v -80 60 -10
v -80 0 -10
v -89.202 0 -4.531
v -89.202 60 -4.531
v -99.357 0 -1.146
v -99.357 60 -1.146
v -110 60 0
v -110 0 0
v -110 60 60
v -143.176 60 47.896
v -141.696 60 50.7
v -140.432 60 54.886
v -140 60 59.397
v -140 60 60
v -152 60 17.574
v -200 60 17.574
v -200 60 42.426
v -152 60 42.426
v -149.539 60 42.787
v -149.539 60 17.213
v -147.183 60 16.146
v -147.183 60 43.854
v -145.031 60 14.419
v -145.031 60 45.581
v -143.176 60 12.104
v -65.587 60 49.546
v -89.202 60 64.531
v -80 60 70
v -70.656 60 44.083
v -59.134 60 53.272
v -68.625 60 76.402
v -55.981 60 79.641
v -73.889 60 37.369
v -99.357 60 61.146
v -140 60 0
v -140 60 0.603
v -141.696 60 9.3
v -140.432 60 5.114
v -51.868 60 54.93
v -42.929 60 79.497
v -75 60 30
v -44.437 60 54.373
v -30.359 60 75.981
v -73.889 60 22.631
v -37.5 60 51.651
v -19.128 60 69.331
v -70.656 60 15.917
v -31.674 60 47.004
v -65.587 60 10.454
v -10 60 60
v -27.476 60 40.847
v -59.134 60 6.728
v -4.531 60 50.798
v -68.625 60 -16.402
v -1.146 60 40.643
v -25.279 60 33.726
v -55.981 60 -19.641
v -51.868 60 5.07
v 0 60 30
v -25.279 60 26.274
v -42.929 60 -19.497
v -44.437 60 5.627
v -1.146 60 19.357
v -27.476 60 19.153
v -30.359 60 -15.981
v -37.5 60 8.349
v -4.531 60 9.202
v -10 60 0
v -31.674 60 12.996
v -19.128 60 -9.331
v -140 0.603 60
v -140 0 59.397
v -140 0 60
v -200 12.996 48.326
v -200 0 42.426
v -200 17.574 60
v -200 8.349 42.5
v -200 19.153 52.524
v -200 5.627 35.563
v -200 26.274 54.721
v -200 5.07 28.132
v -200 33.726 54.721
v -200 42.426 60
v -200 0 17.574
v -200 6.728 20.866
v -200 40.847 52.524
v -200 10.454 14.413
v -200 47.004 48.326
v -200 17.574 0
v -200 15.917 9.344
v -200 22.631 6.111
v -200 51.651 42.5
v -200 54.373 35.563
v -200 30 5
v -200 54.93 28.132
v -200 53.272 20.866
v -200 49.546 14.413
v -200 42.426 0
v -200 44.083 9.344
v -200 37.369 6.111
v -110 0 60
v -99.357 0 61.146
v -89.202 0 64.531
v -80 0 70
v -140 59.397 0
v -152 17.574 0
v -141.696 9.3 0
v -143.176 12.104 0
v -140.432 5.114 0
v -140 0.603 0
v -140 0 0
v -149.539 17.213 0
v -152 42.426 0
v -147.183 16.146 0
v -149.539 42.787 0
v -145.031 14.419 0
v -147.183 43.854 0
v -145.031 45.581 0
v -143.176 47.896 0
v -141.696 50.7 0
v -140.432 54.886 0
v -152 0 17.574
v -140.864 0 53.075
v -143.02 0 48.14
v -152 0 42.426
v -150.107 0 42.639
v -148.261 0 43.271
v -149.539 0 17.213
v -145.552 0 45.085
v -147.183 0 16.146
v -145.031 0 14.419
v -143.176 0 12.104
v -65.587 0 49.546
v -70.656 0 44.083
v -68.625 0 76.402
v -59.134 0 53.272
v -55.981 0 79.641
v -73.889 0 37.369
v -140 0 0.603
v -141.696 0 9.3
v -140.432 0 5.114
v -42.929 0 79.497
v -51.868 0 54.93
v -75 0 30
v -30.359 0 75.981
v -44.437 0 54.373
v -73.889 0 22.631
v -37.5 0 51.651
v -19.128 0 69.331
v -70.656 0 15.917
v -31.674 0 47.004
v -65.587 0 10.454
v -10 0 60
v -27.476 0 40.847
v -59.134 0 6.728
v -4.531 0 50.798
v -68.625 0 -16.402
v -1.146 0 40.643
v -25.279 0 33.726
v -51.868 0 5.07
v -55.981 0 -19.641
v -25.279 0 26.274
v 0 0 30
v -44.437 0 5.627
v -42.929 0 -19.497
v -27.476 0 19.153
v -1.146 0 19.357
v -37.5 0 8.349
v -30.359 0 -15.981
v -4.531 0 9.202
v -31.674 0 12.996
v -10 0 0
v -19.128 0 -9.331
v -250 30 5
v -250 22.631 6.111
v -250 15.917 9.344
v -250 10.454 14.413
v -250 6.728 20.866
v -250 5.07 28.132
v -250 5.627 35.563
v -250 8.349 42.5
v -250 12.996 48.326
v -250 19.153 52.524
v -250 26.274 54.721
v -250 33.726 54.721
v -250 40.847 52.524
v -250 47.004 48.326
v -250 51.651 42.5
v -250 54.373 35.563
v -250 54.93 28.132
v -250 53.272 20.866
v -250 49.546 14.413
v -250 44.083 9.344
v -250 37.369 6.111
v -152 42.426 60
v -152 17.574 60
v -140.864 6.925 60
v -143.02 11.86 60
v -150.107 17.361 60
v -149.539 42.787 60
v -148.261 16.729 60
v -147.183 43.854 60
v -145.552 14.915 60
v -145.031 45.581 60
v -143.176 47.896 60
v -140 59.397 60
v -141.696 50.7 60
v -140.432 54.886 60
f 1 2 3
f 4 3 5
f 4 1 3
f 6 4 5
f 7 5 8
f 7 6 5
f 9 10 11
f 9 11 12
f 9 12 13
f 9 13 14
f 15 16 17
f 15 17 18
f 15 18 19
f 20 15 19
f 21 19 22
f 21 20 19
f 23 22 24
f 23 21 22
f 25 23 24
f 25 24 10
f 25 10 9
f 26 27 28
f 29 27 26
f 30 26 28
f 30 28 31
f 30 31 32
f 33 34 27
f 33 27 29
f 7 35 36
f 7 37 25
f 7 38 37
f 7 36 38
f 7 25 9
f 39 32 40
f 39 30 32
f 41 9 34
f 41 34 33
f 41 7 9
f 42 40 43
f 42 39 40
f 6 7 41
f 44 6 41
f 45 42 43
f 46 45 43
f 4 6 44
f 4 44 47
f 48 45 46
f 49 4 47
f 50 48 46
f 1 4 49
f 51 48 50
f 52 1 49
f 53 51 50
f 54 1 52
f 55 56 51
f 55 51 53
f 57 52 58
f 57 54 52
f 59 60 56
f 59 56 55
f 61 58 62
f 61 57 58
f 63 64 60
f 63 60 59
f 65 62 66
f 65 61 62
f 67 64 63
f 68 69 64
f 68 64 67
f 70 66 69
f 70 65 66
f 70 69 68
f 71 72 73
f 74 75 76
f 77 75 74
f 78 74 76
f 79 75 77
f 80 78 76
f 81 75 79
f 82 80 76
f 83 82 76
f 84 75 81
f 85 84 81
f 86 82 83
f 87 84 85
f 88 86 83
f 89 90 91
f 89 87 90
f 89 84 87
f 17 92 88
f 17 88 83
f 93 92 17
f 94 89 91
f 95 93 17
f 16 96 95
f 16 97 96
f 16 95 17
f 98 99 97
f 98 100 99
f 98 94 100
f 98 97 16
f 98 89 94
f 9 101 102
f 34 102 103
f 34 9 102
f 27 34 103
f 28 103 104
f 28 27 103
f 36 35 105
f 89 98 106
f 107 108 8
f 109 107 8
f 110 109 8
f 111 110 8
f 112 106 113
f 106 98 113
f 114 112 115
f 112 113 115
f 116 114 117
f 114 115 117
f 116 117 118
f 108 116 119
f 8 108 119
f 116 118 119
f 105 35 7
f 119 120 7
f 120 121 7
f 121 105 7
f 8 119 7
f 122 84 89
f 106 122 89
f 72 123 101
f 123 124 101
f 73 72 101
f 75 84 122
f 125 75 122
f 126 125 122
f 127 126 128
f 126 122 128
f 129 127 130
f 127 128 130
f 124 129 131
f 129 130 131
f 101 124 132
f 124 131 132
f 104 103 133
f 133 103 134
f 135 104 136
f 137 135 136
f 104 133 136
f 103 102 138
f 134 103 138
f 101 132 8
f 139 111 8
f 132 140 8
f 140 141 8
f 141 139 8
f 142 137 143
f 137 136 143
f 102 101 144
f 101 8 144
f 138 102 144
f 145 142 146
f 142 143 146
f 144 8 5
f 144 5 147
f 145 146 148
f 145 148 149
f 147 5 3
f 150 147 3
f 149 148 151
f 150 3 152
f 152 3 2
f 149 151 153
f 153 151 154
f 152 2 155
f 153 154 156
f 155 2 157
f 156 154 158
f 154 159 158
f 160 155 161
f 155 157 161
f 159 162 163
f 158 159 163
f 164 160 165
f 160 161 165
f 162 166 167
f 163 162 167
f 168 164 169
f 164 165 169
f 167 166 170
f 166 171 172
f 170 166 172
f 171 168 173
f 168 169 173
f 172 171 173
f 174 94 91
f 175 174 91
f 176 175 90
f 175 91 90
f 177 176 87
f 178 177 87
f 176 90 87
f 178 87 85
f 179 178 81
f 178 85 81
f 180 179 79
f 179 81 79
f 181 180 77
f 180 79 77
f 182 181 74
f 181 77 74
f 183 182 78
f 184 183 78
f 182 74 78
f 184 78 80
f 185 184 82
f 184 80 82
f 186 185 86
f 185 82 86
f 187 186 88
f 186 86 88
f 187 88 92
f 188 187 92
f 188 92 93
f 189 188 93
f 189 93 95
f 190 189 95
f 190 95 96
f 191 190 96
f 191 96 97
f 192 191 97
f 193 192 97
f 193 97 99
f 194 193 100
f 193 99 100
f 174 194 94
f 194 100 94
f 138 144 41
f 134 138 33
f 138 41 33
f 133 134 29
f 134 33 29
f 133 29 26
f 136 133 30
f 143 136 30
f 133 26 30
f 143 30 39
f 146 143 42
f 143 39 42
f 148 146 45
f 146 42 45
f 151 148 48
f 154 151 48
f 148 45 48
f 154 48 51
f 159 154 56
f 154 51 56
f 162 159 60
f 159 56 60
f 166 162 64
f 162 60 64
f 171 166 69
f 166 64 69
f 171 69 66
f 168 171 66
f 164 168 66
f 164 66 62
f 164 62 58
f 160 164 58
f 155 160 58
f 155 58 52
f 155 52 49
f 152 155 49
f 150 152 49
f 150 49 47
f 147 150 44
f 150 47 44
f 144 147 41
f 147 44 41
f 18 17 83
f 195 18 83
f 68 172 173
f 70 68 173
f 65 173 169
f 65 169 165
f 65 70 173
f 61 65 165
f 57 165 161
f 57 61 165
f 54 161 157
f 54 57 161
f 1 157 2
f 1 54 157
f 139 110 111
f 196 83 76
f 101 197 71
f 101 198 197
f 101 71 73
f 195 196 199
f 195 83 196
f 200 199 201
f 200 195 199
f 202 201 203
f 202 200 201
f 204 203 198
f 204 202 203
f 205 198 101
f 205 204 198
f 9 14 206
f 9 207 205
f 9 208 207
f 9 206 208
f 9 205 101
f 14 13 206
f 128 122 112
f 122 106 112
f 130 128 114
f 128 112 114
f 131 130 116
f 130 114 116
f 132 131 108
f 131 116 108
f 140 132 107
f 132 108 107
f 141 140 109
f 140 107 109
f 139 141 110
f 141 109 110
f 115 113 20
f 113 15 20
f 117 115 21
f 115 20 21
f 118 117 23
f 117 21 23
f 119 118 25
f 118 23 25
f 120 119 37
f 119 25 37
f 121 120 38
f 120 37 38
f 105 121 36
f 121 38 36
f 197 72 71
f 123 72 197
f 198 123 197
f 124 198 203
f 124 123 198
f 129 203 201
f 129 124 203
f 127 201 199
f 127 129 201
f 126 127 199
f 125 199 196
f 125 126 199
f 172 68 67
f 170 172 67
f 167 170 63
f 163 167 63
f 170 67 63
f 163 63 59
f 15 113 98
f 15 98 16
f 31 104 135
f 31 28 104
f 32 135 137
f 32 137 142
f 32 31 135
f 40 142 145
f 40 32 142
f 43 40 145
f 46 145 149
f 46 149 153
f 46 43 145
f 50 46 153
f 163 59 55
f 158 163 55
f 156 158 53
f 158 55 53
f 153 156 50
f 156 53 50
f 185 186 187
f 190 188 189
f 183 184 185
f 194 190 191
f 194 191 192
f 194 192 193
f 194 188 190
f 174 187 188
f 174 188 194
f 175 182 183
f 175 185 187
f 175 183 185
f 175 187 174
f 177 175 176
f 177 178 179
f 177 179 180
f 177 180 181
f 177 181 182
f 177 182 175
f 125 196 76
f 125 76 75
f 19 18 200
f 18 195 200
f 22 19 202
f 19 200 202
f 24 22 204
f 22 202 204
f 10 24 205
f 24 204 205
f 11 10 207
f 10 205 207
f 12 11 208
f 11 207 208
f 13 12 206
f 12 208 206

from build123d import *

# Parameters (mm, degrees)
SKETCH1_W           = 200
SKETCH1_H           = 60
BOSS_EXTRUDE1_DEPTH = 60
SKETCH2_R           = 50
SKETCH2_R_2         = 25
BOSS_EXTRUDE2_DEPTH = 60
SKETCH3_R           = 25
CUT_EXTRUDE1_DEPTH  = 60
SKETCH4_R           = 25
BOSS_EXTRUDE3_DEPTH = 50
CUT_EXTRUDE2_DEPTH  = 60
FILLET1_R           = 12
FILLET2_R           = 50


with BuildPart() as part:
    # Sketch1 → Boss-Extrude1 (new body)
    with BuildSketch(Plane.XY):
        with Locations((-100, 30)):
            Rectangle(SKETCH1_W, SKETCH1_H)
    extrude(amount=BOSS_EXTRUDE1_DEPTH)

    # Sketch2 → Boss-Extrude2 (add)
    with BuildSketch(Plane(origin=(0, 60, 0), x_dir=(1, 0, 0), z_dir=(0, 1, 0))):
        with Locations((-50, -30)):
            Circle(SKETCH2_R)
        with Locations((-50, -30)):
            Circle(SKETCH2_R_2, mode=Mode.SUBTRACT)
    extrude(amount=-BOSS_EXTRUDE2_DEPTH)

    # Sketch3 → Cut-Extrude1 (cut)
    with BuildSketch(Plane(origin=(0, 60, 0), x_dir=(1, 0, 0), z_dir=(0, 1, 0))):
        with Locations(Location((-50, -30, 0), (0, 0, 180))):
            Circle(SKETCH3_R)
        with BuildLine():
            ThreePointArc((-10, 0), (-2.565835097, -14.188611699), (0, -30))
            Line((0, -30), (0, 0))
            Line((0, 0), (-10, 0))
        make_face()
        with BuildLine():
            Line((-10, -60), (0, -60))
            Line((0, -60), (0, -30))
            ThreePointArc((0, -30), (-2.565835097, -45.811388301), (-10, -60))
        make_face()
    extrude(amount=-CUT_EXTRUDE1_DEPTH, mode=Mode.SUBTRACT)

    # Sketch4 → Boss-Extrude3 (add)
    with BuildSketch(Plane.ZY.offset(200)):
        with Locations(Location((30, 30, 0), (0, 0, 180))):
            Circle(SKETCH4_R)
    extrude(amount=BOSS_EXTRUDE3_DEPTH)

    # Sketch5 → Cut-Extrude2 (cut)
    with BuildSketch(Plane.ZY.offset(200)):
        Polygon((60, 60), (42.426406871, 60), (60, 42.426406871), align=None)
        Polygon((0, 42.426406871), (17.573593129, 60), (0, 60), align=None)
        Polygon((17.573593129, 0), (0, 17.573593129), (0, 0), align=None)
        Polygon((60, 0), (60, 17.573593129), (42.426406871, 0), align=None)
    extrude(amount=-CUT_EXTRUDE2_DEPTH, mode=Mode.SUBTRACT)

    # Fillet1
    fillet1_edges = [part.edges().sort_by_distance(p)[0] for p in [
        (-140, 8.786796564, 51.213203436),
        (-140, 51.213203436, 51.213203436),
        (-140, 51.213203436, 8.786796564),
        (-140, 8.786796564, 8.786796564),
    ]]
    fillet(fillet1_edges, radius=FILLET1_R)

    # Fillet2
    fillet2_edges = [part.edges().sort_by_distance(p)[0] for p in [
        (-90, 30, 0),
        (-90, 30, 60),
    ]]
    fillet(fillet2_edges, radius=FILLET2_R)


solid = part.part
